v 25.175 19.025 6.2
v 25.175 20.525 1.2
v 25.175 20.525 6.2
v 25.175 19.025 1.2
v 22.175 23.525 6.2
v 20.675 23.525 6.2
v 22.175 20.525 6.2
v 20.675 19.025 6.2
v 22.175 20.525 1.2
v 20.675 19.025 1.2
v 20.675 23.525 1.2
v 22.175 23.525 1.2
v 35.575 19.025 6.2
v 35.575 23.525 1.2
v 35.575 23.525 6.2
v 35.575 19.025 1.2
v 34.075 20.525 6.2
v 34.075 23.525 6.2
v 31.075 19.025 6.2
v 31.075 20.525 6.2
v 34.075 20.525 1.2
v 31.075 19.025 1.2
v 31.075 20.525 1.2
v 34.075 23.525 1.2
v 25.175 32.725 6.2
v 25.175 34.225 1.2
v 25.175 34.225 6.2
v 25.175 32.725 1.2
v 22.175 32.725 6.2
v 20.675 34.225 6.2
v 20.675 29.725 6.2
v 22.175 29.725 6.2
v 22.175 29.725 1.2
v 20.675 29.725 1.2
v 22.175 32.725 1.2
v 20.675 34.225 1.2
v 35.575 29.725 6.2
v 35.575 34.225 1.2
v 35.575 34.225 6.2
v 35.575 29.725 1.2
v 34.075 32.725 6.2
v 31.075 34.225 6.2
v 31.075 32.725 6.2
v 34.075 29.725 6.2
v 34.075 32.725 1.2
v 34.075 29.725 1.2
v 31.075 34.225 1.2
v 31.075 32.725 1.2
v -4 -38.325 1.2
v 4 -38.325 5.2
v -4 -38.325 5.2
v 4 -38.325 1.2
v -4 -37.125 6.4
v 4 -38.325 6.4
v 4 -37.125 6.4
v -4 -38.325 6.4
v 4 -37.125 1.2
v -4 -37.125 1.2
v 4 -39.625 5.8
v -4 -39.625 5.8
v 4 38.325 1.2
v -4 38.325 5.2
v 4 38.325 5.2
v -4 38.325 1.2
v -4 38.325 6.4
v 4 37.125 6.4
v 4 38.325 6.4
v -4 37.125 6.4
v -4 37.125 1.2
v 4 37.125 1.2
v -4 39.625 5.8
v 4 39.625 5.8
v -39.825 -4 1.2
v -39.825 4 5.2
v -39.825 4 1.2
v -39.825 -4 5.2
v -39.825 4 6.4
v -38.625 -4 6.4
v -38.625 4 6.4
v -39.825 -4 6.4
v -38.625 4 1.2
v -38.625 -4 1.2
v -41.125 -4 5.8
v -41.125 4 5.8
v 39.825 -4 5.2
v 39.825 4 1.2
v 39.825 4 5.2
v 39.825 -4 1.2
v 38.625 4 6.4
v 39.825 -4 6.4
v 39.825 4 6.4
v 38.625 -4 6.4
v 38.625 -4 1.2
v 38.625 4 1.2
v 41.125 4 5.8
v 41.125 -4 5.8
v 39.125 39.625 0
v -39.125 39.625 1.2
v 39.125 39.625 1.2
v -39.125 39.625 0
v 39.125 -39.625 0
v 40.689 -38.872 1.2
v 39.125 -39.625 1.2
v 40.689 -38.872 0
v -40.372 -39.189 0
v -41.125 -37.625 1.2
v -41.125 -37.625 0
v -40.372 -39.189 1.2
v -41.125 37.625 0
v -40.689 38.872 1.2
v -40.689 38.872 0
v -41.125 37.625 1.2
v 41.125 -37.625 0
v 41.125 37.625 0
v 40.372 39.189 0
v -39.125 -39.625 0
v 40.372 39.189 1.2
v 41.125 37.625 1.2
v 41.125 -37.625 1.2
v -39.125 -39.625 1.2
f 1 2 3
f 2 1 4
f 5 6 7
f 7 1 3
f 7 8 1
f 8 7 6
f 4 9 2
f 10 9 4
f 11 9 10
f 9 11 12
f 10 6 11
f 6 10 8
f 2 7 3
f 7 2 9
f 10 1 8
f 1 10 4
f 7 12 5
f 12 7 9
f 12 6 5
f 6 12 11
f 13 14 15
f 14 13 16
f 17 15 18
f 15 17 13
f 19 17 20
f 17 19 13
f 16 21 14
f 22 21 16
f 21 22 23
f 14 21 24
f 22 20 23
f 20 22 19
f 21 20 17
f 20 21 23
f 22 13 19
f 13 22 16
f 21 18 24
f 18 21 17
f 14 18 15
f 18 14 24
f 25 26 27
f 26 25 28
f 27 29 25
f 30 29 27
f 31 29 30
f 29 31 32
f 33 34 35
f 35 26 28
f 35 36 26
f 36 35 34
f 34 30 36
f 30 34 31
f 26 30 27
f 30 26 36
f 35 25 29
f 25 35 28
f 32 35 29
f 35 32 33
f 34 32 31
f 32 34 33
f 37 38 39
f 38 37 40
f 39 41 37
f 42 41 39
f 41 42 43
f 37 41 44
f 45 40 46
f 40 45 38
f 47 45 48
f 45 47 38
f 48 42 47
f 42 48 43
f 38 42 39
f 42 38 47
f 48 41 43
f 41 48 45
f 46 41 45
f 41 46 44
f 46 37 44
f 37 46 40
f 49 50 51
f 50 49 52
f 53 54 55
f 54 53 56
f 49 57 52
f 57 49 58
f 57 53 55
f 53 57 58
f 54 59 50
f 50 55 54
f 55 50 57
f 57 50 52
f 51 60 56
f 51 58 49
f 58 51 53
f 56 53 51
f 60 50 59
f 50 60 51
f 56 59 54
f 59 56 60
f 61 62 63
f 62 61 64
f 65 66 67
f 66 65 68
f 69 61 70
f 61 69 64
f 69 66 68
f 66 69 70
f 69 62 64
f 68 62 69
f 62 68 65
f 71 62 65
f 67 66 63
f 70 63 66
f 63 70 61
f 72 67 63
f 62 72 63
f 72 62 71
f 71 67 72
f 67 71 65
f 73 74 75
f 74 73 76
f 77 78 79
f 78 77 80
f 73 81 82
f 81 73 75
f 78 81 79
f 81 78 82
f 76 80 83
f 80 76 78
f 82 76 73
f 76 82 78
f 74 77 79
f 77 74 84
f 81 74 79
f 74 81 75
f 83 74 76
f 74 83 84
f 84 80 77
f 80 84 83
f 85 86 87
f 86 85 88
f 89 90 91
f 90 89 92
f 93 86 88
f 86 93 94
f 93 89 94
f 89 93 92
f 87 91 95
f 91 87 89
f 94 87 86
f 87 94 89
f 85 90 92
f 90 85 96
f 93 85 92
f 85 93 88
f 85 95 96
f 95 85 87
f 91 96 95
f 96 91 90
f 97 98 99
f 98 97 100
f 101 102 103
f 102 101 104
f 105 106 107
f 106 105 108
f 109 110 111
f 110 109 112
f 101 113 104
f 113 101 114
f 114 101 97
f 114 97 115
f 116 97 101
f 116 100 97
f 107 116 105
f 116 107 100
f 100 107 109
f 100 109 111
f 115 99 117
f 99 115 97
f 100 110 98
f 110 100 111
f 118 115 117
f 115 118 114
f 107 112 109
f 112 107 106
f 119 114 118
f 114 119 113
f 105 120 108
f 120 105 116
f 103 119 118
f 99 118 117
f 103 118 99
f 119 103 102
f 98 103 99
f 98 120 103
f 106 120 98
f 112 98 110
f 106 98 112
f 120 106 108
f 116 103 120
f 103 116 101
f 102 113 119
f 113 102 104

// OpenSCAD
// ============================================================
//  Caldera Numpad — Bottom Plate
//  Flat plate + EC11 encoder housing + snap clips (inward)
// ============================================================

pitch_x          = 18.75;  // cx + spacing (18 + 0.75)
pitch_y          = 17.75;  // cy + spacing (17 + 0.75)
cols             = 4;
rows             = 4;
pad_x            = 6;
pad_y            = 6;
switch_cutout    = 14;
fillet_r         = 2.0;
wall_thickness   = 2.5;
plate_thickness  = 1.2;

// EC11 Rotary Encoder Housing — corner post design
// Four L-shaped posts grip the encoder at its corners.
// All four sides are fully open: pins and legs are accessible for hand-wiring.
enc_body_w       = 11.7;   // encoder body width  (X), from datasheet
enc_body_d       = 12.0;   // encoder body depth  (Y), from datasheet
enc_tolerance    = 0.1;    // clearance per side
enc_corner       = 3.0;    // ADJUST: how far each L-post wraps along each edge
enc_wall         = 1.5;    // L-post wall thickness (outward from body face)
enc_height       = 5.0;    // post height above plate surface

// Derived — inner slot dimensions (body + tolerance)
enc_slot_w       = enc_body_w + enc_tolerance * 2;
enc_slot_d       = enc_body_d + enc_tolerance * 2;

// Snap clip (must match numpad_case.scad)
ridge_height     = 1.2;
ridge_depth      = 1.0;
ridge_width      = 8.0;
ridge_z          = 3.0;
clip_thickness   = 1.2;
clip_gap         = 0.3;
clip_height      = ridge_z + ridge_height + 1.0;

board_w = (cols - 1) * pitch_x + switch_cutout + pad_x * 2;
board_h = (rows - 1) * pitch_y + switch_cutout + pad_y * 2;

pot_x = ((cols - 1) / 2) * pitch_x;
pot_y = ((rows - 1) / 2) * pitch_y;

module rounded_rect(w, h, r) {
    offset(r=r) offset(r=-r) square([w, h], center=true);
}

module bottom_plate() {
    linear_extrude(plate_thickness)
        rounded_rect(board_w, board_h, fillet_r);
}

// EC11 encoder housing — four L-shaped corner posts.
//
// Top view of one corner (bottom-left shown, others are mirrors):
//
//   +--+
//   |  |  <- enc_wall (outward thickness)
//   +--+--...open...
//      |  <- enc_wall
//      +
//
// The encoder body drops in from above; the four corners locate it in X and Y.
// All four sides between the posts are fully open for pin/leg access.
// No bottom floor — encoder rests directly on the plate surface.
// No shaft hole needed (shaft points up through the open top).
//
// enc_corner controls how far each leg of the L extends along the encoder edge.
// Increase it for a tighter grip; decrease it to open up more side access.

module enc_corner_post(sx, sy) {
    // sx, sy: +1 or -1 — selects which corner
    // Post origin is at the outer corner; L-arms extend inward along each axis.
    translate([pot_x + sx * (enc_slot_w/2 + enc_wall),
               pot_y + sy * (enc_slot_d/2 + enc_wall),
               plate_thickness]) {
        // Arm along X direction (runs parallel to X axis)
        translate([sx < 0 ? 0 : -(enc_corner + enc_wall),
                   sy < 0 ? 0 : -enc_wall,
                   0])
            cube([enc_corner + enc_wall,
                  enc_wall,
                  enc_height]);

        // Arm along Y direction (runs parallel to Y axis)
        translate([sx < 0 ? 0 : -enc_wall,
                   sy < 0 ? 0 : -(enc_corner + enc_wall),
                   0])
            cube([enc_wall,
                  enc_corner + enc_wall,
                  enc_height]);
    }
}

module encoder_housing() {
    enc_corner_post(-1, -1);  // front-left
    enc_corner_post( 1, -1);  // front-right
    enc_corner_post(-1,  1);  // back-left
    enc_corner_post( 1,  1);  // back-right
}

// --- Single clip arm + hook ---------------------------------
//  Arm: vertical wall standing up from the plate (+Z).
//  Hook: horizontal wedge at the top of the arm.
//    - Flat bottom face: locks UNDER the ridge flat top face.
//    - Angled top face: cams OVER the ridge when pressing plate up.
//  The tip of the triangle points AWAY from the arm (outward toward wall),
//  so the ramp faces upward/outward — correct for sliding past the ridge.
//
//    wall side
//       |
//       |    /|  <- angled top (cams over ridge going up)
//       |   / |
//       |  /  |  <- flat bottom (locks under ridge)
//       | /   |
//       |/arm |
//  plate+-----+
//
module snap_clip() {
    // Vertical arm
    cube([clip_thickness, ridge_width, clip_height], center=false);

    // Hook: tip points in +X (away from arm base, toward wall)
    // Flat face at bottom of hook, angled face at top
    translate([clip_thickness, ridge_width, clip_height - ridge_height])
        rotate([90, 0, 0])
            linear_extrude(ridge_width)
                polygon([
                    [0,                      ridge_height],  // arm top, inner — angled face starts here
                    [ridge_depth + clip_gap,  ridge_height/2],  // tip — angled ramp points up+out
                    [0,                      0            ]   // arm base, inner — flat bottom face
                ]);
}

// --- Four clips, one per side, inside the case walls --------
module snap_clips() {
    inner_w = board_w - wall_thickness * 2;
    inner_h = board_h - wall_thickness * 2;

    // Front — hook points toward front wall (-Y)
    translate([-ridge_width/2, -inner_h/2, plate_thickness])
        rotate([0, 0, -90])
            snap_clip();

    // Back — hook points toward back wall (+Y)
    translate([ridge_width/2, inner_h/2, plate_thickness])
        rotate([0, 0, 90])
            snap_clip();

    // Left — hook points toward left wall (-X)
    translate([-inner_w/2, ridge_width/2, plate_thickness])
        rotate([0, 0, 180])
            snap_clip();

    // Right — hook points toward right wall (+X)
    translate([inner_w/2, -ridge_width/2, plate_thickness])
        rotate([0, 0, 0])
            snap_clip();
}

module numpad_bottom() {
    color("SlateGray")      bottom_plate();
    color("DimGray")        encoder_housing();
    color("CornflowerBlue") snap_clips();
}

numpad_bottom();
